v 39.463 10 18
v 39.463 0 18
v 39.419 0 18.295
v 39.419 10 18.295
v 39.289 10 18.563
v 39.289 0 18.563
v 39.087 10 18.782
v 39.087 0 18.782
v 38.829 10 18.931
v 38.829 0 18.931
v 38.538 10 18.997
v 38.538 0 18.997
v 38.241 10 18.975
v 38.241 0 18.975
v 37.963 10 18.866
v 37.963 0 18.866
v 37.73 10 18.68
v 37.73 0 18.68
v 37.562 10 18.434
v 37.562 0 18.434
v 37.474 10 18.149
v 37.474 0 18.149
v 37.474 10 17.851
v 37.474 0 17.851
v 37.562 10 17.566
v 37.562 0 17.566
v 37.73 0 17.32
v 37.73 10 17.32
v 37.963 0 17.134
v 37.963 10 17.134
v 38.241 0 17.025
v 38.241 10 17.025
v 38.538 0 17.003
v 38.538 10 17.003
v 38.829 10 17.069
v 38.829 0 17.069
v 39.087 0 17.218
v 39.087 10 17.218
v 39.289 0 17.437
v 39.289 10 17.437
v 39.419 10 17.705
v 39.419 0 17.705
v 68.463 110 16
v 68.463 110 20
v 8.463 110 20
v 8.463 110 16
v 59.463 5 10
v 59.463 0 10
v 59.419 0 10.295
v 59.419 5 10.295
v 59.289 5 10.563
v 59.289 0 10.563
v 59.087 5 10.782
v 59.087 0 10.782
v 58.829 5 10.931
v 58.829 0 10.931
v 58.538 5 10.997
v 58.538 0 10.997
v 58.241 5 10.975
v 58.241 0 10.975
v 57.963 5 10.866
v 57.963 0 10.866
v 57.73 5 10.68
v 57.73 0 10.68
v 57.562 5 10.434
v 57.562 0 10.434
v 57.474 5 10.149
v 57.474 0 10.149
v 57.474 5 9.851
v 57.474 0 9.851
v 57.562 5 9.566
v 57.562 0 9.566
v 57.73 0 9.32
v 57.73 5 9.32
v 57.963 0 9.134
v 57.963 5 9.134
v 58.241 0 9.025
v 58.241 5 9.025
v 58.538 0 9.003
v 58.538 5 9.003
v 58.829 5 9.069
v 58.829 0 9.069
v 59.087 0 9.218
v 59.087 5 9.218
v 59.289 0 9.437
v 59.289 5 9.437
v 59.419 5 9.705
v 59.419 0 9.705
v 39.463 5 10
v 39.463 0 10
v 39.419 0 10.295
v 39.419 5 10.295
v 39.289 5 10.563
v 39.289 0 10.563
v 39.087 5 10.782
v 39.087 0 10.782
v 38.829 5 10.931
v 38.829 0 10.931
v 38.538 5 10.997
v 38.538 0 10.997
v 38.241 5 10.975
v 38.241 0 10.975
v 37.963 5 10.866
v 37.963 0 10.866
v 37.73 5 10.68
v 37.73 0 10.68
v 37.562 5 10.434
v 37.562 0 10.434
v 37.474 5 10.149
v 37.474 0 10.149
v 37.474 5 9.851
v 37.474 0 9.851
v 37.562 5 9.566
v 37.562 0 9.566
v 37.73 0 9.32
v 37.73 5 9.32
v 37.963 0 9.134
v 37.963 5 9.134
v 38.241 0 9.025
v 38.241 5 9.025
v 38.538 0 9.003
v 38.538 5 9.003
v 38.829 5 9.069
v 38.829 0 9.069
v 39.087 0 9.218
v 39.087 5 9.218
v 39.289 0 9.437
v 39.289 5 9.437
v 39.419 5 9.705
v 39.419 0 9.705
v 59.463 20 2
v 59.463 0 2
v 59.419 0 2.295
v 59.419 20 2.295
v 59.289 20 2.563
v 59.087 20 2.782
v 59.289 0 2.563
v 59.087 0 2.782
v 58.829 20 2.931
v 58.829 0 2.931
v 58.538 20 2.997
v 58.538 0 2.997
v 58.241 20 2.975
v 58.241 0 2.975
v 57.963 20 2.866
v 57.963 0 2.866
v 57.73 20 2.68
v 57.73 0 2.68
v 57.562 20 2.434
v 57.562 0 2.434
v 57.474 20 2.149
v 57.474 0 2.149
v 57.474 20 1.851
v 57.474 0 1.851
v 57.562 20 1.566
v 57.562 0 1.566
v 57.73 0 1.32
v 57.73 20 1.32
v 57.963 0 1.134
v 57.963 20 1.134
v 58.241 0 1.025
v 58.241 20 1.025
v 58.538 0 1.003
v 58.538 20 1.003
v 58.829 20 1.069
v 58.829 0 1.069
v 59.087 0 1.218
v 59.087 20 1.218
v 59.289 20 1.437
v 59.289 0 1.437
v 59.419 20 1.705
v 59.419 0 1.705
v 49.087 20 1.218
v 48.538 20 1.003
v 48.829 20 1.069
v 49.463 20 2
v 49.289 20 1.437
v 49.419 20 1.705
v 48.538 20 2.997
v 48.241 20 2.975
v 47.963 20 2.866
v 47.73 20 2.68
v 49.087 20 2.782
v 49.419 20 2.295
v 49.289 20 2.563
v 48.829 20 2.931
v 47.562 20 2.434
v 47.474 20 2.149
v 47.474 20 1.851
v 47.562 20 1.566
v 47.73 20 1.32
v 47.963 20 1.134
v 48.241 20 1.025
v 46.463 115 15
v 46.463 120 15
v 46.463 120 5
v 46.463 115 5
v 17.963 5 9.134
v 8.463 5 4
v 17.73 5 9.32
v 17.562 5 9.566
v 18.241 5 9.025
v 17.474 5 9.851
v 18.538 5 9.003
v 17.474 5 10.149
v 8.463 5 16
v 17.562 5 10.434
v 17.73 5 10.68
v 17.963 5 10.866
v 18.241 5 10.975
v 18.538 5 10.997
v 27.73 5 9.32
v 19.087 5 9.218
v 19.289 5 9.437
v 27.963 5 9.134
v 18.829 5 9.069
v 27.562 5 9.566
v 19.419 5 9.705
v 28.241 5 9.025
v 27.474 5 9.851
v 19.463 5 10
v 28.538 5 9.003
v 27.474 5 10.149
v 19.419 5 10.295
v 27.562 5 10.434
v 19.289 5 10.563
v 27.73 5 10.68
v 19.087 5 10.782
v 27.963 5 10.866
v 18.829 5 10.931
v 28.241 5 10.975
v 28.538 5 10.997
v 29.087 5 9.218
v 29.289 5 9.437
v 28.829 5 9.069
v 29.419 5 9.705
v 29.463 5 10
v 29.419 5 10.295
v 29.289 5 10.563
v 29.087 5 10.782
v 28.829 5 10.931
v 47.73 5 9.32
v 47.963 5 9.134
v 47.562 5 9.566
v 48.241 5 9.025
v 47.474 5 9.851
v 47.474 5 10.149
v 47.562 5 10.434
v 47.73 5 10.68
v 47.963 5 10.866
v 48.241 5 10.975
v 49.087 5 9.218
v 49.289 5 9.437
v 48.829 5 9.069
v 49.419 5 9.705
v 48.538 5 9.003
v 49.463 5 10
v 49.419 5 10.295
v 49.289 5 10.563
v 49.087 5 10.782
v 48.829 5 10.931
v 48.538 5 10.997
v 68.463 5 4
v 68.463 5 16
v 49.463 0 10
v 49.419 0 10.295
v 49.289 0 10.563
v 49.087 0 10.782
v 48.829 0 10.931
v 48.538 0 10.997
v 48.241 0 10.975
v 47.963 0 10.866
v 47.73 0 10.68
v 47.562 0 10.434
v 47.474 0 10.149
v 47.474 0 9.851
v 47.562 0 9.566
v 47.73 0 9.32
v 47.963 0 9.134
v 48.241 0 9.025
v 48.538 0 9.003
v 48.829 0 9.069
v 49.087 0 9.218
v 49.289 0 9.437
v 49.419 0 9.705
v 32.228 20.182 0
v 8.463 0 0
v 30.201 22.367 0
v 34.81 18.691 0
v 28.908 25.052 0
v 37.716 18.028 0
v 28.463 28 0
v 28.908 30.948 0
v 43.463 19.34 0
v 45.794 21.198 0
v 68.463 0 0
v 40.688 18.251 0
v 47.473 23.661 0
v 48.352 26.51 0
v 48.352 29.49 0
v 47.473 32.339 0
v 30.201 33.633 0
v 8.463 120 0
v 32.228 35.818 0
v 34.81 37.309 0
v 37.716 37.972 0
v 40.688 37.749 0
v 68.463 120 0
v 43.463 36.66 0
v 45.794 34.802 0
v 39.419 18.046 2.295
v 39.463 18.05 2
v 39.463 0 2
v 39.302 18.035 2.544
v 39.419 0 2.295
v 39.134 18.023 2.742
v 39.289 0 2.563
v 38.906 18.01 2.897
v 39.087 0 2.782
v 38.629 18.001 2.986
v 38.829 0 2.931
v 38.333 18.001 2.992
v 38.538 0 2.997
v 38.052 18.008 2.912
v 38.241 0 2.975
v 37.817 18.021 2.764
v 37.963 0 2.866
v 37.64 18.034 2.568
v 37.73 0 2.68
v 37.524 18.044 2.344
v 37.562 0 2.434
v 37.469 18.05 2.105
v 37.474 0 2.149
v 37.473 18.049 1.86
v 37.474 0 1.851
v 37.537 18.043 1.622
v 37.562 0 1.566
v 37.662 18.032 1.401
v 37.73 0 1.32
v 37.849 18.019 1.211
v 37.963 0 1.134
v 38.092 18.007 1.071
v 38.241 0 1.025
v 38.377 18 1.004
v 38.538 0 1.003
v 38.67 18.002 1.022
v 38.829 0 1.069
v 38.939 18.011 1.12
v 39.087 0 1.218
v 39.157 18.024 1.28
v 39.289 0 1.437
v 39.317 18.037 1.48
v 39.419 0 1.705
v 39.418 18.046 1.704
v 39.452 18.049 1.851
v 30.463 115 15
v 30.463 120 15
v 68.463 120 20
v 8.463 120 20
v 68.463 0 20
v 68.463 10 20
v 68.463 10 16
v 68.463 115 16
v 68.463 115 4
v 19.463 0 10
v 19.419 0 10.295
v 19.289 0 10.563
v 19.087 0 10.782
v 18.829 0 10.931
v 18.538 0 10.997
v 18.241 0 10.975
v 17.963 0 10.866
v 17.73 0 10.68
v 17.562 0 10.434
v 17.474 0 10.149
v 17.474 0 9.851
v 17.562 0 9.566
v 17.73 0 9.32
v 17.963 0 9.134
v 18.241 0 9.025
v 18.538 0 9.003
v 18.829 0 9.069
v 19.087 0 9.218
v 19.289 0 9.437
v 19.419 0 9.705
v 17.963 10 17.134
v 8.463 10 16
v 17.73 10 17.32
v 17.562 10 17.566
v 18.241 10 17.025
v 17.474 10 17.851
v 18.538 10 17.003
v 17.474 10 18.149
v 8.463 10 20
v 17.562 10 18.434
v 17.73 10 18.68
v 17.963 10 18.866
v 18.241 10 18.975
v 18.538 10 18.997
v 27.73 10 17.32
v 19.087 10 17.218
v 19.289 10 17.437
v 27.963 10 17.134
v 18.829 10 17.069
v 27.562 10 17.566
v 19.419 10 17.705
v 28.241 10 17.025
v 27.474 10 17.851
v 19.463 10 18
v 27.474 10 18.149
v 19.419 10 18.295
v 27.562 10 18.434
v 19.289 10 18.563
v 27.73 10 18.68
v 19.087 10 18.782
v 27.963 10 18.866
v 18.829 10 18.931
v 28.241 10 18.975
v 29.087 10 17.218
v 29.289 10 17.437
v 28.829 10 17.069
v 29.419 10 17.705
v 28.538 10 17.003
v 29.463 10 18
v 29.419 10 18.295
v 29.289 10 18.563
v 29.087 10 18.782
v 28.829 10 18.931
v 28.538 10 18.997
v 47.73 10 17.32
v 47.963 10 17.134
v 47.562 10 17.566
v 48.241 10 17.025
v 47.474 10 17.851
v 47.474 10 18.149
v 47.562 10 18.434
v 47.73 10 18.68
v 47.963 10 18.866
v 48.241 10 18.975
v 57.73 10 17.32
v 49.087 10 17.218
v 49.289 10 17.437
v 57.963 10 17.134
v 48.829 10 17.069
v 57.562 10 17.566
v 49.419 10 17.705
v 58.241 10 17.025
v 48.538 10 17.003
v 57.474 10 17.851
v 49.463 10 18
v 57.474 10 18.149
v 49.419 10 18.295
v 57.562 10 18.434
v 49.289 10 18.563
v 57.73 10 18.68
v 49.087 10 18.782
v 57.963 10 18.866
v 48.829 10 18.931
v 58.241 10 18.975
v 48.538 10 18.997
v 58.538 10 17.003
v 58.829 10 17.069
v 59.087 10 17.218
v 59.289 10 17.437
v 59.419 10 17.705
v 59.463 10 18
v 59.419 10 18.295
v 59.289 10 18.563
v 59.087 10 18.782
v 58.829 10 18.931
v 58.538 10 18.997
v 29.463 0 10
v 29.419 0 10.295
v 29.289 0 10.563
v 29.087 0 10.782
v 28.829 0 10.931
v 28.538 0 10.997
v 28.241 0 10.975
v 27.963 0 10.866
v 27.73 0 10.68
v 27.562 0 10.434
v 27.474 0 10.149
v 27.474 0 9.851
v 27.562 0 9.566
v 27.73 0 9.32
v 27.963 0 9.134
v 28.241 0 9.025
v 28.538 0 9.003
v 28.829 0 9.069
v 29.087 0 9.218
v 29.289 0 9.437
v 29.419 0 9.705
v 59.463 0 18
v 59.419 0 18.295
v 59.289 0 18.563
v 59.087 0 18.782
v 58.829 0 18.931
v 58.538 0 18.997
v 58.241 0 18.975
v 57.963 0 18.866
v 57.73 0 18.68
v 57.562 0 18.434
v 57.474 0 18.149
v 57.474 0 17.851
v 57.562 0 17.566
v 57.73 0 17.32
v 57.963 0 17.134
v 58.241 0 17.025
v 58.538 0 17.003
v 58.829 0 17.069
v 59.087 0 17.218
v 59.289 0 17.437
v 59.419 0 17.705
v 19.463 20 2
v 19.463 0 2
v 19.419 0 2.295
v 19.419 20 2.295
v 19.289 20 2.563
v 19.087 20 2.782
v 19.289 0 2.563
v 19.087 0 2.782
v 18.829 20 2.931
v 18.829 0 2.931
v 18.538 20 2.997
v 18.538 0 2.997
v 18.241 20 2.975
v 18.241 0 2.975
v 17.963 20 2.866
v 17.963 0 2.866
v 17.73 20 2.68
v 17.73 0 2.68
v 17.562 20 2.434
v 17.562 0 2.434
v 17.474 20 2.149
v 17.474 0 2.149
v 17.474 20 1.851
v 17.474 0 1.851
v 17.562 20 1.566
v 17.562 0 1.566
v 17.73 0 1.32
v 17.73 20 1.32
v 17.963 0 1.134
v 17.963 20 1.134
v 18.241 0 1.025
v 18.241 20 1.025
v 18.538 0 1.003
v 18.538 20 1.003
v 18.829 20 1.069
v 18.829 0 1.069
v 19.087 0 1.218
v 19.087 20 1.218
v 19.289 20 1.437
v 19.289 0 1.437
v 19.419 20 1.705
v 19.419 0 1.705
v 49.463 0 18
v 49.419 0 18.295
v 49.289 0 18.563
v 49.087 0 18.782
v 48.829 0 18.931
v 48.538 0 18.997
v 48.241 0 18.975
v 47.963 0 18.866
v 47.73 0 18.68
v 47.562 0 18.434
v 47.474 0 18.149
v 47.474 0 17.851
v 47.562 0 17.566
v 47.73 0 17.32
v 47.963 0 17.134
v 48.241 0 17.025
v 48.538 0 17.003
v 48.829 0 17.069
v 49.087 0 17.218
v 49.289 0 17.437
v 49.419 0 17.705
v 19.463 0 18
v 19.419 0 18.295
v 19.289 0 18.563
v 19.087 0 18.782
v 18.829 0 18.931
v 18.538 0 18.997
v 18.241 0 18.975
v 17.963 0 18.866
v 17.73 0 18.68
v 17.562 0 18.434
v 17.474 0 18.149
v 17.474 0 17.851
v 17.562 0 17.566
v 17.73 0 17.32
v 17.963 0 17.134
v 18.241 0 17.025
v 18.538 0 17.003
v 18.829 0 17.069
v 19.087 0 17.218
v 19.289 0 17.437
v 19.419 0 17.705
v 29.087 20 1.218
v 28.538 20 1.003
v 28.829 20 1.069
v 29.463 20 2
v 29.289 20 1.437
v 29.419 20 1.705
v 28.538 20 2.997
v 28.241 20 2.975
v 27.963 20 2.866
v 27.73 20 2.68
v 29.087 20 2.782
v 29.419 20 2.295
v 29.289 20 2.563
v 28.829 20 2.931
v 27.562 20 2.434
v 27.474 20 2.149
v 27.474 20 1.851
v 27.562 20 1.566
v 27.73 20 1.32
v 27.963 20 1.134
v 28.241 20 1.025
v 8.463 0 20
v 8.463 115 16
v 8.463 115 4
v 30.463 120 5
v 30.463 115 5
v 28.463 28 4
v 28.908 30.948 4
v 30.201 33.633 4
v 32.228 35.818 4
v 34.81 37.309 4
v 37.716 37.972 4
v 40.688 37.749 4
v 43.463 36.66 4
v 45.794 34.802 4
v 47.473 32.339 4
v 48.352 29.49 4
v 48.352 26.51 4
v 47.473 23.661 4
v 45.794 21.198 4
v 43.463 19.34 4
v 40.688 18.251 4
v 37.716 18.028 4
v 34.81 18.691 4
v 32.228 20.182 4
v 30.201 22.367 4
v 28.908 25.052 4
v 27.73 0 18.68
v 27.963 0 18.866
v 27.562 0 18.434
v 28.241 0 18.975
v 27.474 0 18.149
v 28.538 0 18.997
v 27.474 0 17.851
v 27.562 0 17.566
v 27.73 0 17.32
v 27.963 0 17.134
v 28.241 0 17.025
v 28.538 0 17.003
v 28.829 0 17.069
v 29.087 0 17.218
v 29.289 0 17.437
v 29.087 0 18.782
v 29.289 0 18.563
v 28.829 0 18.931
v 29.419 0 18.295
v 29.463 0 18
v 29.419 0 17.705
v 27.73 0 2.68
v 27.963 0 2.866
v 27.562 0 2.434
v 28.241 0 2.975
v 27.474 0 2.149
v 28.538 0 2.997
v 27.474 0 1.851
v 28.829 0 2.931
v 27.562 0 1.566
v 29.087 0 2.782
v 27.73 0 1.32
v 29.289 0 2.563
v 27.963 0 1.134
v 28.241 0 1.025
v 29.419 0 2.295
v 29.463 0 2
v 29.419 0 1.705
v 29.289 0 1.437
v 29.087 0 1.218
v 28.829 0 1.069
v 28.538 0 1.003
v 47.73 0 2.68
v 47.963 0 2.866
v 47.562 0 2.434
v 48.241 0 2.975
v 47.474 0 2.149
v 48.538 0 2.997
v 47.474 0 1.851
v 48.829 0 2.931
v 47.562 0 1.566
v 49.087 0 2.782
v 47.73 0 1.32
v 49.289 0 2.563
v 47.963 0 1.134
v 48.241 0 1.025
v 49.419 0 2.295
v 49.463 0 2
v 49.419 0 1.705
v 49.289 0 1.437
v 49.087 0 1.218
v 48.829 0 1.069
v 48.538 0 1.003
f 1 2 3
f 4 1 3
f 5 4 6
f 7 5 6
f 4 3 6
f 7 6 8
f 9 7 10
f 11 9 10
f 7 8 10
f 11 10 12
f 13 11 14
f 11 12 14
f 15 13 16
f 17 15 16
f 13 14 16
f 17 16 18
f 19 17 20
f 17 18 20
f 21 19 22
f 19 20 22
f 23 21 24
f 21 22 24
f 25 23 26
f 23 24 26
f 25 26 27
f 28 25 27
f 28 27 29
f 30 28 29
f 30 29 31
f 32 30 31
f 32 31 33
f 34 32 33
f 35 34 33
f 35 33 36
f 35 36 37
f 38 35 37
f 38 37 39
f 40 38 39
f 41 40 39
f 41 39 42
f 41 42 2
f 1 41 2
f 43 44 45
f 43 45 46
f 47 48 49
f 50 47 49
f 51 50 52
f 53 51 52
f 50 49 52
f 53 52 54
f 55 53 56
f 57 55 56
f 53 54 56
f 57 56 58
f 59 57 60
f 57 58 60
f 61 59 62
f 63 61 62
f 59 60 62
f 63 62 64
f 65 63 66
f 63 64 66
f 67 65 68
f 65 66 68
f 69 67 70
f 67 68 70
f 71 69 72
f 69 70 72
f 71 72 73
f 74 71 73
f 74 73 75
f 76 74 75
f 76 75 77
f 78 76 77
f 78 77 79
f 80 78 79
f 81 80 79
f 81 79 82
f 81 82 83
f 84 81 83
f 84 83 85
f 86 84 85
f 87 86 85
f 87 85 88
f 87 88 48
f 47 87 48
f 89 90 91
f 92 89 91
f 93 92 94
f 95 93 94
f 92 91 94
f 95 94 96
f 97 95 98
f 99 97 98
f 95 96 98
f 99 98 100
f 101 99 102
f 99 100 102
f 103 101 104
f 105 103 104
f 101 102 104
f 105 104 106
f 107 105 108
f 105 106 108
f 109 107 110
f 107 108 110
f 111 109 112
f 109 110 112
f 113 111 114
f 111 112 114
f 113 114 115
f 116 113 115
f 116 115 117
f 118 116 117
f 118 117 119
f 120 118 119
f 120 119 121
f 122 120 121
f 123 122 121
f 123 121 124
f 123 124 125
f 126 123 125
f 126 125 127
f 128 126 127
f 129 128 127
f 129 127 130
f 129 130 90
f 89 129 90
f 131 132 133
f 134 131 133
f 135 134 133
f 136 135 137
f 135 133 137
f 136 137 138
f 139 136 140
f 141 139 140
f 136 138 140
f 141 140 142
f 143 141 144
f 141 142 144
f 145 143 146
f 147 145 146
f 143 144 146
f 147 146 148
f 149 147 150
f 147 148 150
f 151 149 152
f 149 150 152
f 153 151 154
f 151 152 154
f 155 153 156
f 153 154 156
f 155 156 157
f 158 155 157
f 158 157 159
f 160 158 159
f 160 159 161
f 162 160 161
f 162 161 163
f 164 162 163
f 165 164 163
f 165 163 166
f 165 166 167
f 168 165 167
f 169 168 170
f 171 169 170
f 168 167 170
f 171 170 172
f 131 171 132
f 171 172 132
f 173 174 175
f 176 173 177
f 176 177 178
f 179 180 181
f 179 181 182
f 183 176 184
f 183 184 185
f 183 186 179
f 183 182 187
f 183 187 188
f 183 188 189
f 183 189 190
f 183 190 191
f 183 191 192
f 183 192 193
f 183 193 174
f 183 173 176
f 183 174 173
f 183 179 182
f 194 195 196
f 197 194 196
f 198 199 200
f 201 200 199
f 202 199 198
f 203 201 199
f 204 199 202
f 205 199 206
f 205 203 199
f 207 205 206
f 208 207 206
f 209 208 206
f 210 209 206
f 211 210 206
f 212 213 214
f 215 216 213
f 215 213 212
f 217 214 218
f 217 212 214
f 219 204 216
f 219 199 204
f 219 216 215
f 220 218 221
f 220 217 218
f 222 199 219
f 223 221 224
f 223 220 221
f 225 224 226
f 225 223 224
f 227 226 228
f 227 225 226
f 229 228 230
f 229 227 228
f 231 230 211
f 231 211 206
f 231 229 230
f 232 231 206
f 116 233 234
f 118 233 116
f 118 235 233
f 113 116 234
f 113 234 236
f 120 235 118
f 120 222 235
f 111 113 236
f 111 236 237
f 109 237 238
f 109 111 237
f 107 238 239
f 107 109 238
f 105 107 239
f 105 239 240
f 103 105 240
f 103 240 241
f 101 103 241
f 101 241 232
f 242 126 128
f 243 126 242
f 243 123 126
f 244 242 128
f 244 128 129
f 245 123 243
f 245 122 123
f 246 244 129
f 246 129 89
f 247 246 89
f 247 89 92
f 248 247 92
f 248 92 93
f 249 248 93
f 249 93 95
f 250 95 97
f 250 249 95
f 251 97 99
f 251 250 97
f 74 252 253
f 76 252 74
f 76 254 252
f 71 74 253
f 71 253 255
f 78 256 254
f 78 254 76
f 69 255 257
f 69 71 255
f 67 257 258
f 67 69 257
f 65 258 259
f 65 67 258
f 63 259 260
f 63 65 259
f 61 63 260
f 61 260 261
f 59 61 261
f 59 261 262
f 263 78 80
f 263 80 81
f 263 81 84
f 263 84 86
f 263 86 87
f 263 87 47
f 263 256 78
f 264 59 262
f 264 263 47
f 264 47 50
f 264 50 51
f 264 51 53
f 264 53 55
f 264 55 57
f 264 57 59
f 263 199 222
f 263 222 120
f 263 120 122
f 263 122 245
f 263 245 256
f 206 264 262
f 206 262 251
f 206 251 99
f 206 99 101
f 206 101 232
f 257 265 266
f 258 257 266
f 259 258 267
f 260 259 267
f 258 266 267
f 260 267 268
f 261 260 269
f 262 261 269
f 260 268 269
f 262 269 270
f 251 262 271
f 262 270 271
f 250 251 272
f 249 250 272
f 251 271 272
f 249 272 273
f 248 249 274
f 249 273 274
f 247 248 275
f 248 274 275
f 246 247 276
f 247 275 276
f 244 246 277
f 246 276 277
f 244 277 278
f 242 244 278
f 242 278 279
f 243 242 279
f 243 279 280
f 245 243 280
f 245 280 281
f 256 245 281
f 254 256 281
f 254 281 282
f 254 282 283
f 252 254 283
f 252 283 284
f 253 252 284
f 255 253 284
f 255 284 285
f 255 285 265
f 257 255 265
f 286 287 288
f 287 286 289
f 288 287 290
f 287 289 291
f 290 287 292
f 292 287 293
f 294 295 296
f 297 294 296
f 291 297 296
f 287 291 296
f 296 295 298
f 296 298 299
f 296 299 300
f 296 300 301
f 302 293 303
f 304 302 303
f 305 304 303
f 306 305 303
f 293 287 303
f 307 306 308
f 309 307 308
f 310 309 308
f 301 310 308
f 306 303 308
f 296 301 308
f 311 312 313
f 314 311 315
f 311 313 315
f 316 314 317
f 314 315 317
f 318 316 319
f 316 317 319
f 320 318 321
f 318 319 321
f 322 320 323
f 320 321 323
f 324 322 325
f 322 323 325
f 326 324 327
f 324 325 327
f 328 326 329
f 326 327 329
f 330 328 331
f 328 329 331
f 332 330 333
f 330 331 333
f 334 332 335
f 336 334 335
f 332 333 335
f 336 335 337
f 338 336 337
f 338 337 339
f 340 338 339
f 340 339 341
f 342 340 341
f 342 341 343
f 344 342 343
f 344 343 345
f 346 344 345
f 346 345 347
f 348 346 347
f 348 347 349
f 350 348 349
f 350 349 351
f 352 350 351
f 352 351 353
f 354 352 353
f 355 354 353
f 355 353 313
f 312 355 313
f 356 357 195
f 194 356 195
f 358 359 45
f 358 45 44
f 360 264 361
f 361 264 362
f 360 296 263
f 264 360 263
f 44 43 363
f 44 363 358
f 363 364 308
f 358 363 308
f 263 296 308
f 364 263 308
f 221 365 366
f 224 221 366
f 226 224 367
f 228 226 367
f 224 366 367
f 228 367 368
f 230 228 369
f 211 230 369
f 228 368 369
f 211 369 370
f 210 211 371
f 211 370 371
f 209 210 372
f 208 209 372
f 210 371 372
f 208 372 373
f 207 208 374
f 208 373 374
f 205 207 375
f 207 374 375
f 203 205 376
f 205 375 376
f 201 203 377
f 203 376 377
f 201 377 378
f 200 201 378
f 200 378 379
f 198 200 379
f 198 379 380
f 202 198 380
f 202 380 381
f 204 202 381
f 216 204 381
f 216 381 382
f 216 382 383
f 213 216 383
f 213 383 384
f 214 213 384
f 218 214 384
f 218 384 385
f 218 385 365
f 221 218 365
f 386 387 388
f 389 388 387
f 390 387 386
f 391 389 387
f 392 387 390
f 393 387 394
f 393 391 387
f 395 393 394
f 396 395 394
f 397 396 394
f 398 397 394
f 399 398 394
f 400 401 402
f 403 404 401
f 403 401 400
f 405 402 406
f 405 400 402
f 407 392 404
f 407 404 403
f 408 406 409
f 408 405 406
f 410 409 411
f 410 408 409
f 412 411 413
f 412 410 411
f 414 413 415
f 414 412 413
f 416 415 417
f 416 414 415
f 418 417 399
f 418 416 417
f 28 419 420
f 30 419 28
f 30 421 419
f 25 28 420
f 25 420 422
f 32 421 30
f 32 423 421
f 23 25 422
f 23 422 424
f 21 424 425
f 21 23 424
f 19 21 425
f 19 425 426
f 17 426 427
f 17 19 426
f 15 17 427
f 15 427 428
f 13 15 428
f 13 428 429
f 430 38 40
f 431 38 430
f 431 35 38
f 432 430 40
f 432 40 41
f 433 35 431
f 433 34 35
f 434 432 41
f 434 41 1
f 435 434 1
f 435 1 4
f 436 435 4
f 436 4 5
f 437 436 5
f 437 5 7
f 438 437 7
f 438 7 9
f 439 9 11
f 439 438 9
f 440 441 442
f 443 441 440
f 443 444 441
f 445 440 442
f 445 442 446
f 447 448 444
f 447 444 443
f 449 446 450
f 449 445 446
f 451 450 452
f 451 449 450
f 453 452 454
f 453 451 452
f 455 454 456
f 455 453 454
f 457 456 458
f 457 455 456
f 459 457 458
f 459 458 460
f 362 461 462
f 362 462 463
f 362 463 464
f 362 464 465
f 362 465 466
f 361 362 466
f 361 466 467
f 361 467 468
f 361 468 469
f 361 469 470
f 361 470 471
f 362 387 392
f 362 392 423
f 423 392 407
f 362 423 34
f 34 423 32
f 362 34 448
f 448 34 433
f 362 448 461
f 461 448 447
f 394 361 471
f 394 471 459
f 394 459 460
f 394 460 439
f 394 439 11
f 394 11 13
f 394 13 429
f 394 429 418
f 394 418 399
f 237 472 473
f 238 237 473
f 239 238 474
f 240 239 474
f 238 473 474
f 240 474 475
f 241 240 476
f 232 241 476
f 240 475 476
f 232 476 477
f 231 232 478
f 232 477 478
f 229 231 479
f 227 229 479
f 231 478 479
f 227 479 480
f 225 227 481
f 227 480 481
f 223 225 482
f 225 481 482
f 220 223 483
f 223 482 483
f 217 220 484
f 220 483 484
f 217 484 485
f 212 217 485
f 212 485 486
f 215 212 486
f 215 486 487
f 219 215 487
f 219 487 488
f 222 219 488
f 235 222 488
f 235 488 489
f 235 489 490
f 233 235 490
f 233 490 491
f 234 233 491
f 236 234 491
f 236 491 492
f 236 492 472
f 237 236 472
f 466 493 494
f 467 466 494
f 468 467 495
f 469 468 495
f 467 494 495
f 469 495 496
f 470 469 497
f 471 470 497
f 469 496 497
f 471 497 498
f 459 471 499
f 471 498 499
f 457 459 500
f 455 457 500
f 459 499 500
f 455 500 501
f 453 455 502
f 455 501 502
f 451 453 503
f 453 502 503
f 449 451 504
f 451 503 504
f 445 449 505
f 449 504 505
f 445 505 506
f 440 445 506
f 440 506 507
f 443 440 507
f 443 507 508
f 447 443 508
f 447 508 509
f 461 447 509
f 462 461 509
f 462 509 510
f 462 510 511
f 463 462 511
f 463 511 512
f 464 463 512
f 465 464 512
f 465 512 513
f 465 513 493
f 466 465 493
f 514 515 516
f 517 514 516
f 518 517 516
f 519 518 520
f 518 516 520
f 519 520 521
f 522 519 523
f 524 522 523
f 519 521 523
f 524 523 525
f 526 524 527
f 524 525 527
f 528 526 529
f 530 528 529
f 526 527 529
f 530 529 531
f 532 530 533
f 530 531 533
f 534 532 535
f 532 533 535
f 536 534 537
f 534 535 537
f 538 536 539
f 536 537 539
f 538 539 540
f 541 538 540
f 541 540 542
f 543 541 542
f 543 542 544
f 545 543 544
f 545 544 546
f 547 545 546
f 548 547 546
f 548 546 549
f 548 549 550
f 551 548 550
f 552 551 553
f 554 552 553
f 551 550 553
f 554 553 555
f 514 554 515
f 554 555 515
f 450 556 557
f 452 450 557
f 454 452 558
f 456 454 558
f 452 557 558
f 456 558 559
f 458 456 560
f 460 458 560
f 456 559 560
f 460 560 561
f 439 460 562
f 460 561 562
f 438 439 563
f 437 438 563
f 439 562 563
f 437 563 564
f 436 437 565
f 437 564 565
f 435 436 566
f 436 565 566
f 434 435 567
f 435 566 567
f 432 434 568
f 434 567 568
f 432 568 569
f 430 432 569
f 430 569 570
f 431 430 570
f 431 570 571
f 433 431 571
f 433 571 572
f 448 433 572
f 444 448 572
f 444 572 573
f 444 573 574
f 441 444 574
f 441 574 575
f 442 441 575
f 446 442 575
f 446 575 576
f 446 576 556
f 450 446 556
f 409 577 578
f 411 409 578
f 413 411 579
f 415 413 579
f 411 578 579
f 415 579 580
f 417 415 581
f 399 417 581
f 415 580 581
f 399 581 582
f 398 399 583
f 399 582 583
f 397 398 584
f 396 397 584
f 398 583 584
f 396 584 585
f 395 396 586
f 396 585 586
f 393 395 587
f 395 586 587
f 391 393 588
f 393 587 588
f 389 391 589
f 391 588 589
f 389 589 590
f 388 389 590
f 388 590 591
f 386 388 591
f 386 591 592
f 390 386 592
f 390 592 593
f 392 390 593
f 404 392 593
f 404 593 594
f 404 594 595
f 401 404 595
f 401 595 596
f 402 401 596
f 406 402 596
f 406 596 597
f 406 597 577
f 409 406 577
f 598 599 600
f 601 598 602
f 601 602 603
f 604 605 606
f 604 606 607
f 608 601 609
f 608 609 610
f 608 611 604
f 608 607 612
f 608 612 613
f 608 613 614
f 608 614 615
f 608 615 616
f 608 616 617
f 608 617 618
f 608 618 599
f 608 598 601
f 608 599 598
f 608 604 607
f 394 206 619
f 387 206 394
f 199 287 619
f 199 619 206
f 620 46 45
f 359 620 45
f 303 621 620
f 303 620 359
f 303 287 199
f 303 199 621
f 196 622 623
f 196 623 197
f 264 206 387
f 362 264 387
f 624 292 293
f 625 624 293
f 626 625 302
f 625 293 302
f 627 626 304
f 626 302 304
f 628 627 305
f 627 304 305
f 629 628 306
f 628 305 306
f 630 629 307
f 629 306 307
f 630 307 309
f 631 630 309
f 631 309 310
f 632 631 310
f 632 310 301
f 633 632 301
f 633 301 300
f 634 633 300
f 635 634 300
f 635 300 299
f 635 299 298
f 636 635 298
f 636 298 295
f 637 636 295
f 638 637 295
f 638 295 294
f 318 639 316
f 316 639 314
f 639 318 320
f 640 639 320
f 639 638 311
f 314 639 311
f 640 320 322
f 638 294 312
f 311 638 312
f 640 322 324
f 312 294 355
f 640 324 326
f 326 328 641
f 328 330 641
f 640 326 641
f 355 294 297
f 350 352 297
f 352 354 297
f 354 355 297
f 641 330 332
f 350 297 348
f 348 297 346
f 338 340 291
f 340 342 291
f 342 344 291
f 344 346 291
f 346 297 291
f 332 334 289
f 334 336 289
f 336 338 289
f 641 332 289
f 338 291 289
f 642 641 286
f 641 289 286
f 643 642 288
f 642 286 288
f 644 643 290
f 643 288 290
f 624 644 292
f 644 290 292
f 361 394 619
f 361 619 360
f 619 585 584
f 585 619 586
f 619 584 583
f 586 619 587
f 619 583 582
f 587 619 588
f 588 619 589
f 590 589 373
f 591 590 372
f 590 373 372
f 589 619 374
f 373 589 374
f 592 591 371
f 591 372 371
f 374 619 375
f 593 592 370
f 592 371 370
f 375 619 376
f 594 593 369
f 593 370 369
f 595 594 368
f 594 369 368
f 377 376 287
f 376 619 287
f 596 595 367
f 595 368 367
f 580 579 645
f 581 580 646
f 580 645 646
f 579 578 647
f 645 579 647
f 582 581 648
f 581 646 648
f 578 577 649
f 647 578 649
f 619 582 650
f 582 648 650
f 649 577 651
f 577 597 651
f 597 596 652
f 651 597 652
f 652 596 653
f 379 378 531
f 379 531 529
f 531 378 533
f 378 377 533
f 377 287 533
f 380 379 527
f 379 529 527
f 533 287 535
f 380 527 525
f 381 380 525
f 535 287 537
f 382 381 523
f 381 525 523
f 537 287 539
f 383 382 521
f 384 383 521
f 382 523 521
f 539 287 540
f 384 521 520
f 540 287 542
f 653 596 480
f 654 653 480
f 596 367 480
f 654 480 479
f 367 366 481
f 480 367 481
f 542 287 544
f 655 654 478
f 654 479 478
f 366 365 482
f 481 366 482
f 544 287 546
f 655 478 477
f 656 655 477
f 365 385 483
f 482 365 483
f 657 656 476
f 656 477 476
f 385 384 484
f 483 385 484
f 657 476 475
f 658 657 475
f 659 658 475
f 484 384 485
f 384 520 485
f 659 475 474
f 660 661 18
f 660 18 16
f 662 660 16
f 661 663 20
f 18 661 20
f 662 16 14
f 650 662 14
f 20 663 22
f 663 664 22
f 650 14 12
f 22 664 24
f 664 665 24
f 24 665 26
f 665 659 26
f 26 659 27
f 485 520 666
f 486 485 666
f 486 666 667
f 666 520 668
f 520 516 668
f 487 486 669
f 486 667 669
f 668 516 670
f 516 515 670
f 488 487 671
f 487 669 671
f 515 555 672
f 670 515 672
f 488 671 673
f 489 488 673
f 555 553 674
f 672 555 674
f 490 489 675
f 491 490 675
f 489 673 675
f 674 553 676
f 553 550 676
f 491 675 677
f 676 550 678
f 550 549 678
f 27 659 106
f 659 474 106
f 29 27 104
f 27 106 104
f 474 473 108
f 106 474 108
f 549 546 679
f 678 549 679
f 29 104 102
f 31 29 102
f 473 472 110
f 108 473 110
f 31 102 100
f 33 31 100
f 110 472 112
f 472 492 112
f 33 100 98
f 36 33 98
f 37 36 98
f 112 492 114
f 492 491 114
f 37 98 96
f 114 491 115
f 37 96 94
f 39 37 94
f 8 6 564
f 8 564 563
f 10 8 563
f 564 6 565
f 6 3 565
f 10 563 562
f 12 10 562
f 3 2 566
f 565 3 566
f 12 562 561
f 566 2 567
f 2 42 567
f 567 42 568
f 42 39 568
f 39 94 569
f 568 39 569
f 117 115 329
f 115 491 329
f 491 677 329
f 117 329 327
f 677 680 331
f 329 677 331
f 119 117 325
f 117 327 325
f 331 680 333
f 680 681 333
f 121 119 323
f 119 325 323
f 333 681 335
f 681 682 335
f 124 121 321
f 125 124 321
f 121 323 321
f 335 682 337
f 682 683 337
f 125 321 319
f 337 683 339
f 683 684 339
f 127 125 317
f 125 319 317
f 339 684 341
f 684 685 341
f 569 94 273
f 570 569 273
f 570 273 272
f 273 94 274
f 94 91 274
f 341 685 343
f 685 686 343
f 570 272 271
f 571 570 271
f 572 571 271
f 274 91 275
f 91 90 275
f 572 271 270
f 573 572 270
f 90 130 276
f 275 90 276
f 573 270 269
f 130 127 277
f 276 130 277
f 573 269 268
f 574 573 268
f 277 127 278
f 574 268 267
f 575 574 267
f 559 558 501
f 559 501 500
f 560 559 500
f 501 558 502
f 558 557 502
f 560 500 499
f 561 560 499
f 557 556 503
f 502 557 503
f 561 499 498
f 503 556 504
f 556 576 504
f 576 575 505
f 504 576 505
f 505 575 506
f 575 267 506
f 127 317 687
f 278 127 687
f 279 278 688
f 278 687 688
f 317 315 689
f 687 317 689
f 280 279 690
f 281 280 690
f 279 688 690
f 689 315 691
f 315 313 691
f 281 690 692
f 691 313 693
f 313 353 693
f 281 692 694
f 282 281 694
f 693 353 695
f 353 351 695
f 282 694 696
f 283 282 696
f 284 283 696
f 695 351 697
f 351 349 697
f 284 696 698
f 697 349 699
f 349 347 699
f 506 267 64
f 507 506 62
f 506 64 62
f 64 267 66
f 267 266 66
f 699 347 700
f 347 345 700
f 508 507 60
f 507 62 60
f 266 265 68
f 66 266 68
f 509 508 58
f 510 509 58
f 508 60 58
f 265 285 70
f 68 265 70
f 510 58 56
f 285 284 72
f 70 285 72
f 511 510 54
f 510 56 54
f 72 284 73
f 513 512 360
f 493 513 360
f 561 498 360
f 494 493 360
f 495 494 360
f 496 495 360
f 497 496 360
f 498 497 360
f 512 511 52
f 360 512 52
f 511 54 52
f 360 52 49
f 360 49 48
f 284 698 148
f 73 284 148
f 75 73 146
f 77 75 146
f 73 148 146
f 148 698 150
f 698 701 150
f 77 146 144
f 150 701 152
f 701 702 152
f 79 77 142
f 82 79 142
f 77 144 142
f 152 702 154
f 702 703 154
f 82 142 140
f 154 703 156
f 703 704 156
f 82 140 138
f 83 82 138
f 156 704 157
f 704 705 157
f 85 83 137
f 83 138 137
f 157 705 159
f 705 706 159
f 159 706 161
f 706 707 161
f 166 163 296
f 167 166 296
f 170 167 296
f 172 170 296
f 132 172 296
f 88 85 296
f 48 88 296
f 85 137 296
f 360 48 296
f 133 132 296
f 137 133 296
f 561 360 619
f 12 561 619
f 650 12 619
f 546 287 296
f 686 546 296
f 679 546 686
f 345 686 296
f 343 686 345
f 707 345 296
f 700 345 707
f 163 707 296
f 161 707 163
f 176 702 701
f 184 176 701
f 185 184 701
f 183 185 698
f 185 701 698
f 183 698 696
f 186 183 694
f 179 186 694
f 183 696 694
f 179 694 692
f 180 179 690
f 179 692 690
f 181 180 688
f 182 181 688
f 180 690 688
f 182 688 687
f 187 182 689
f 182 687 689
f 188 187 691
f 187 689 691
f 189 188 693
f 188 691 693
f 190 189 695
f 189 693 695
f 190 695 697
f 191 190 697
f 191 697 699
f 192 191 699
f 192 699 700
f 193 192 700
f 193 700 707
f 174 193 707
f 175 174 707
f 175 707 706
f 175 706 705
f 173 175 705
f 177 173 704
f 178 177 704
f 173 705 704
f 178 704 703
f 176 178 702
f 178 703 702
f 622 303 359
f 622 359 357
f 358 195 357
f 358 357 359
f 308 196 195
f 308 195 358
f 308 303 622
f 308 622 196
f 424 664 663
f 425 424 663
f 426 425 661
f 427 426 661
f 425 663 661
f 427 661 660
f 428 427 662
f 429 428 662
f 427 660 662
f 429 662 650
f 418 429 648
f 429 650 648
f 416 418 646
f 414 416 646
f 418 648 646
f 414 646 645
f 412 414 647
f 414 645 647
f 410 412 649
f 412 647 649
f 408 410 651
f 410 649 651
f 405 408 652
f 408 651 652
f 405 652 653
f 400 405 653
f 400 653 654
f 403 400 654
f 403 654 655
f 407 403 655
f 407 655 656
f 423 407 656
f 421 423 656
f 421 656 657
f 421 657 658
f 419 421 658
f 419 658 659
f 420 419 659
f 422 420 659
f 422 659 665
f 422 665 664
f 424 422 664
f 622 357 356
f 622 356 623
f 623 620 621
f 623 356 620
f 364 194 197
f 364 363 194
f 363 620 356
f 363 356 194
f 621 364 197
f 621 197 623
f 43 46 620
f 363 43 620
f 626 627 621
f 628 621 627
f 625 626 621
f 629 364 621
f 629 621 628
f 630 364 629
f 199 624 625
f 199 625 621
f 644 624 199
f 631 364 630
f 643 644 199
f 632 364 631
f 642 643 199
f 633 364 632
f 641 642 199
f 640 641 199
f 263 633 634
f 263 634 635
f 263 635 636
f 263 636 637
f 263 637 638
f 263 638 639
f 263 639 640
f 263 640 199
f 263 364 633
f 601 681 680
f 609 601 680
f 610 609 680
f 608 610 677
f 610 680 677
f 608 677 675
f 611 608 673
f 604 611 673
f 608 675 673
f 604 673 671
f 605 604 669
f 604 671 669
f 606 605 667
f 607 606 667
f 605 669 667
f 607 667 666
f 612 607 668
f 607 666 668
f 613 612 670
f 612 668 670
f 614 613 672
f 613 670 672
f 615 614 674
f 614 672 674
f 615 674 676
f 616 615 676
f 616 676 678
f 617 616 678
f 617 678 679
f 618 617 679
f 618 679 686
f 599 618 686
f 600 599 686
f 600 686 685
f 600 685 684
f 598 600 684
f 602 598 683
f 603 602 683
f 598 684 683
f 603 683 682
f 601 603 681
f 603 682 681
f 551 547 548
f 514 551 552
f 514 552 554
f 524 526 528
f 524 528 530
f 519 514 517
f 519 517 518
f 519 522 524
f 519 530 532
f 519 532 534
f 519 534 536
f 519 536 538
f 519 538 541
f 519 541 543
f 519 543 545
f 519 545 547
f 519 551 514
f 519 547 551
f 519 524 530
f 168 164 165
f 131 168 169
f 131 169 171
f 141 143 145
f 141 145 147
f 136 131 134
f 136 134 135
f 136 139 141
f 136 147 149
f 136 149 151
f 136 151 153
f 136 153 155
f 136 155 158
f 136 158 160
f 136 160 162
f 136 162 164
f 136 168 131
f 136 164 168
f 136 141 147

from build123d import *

# Parameters (mm, degrees)
ESQUISSE1_W                = 60
ESQUISSE1_H                = 120
BOSS_EXTRU_1_DEPTH         = 20
ENL_V_MAT_EXTRU_1_DEPTH    = 61
ESQUISSE3_W                = 16
ESQUISSE3_H                = 10
ENL_V_MAT_EXTRU_3_DEPTH    = 5
ESQUISSE4_R                = 10
ENL_V_MAT_EXTRU_4_DEPTH    = 21
ESQUISSE5_R                = 1
ENL_V_MAT_EXTRU_5_DEPTH    = 20
R_P_TITION_LIN_AIRE1_COUNT = 3
R_P_TITION_LIN_AIRE1_PITCH = 10
R_P_TITION_LIN_AIRE2_COUNT = 3
R_P_TITION_LIN_AIRE2_PITCH = 10


with BuildPart() as part:
    # Esquisse1 → Boss.-Extru.1 (new body)
    with BuildSketch(Plane.XY):
        with Locations((38.463255814, 60)):
            Rectangle(ESQUISSE1_W, ESQUISSE1_H)
    extrude(amount=BOSS_EXTRU_1_DEPTH)

    # Esquisse2 → Enlèv. mat.-Extru.1 (cut, through all)
    with BuildSketch(Plane(origin=(68.463255814, 0, 0), x_dir=(0, 0, -1), z_dir=(1, 0, 0))):
        Polygon((-20, 110), (-16, 110), (-16, 115), (-4, 115), (-4, 5), (-16, 5), (-16, 10), (-20, 10), align=None)
    extrude(amount=-ENL_V_MAT_EXTRU_1_DEPTH, mode=Mode.SUBTRACT)

    # Esquisse3 → Enlèv. mat.-Extru.3 (cut)
    with BuildSketch(Plane(origin=(0, 120, 0), x_dir=(1, 0, 0), z_dir=(0, 1, 0))):
        with Locations((38.463255814, -10)):
            Rectangle(ESQUISSE3_W, ESQUISSE3_H)
    extrude(amount=-ENL_V_MAT_EXTRU_3_DEPTH, mode=Mode.SUBTRACT)

    # Esquisse4 → Enlèv. mat.-Extru.4 (cut, through all)
    with BuildSketch(Plane(origin=(0, 0, 0), x_dir=(-1, 0, 0), z_dir=(0, 0, -1))):
        with Locations((-38.463255814, 28)):
            Circle(ESQUISSE4_R)
    extrude(amount=-ENL_V_MAT_EXTRU_4_DEPTH, mode=Mode.SUBTRACT)

    # Esquisse5 → Enlèv. mat.-Extru.5 (cut)
    with BuildSketch(Plane.XZ):
        with Locations((38.463255814, 18)):
            Circle(ESQUISSE5_R)
        with Locations((38.463255814, 2)):
            Circle(ESQUISSE5_R)
        with Locations((38.463255814, 10)):
            Circle(ESQUISSE5_R)
    enl_v_mat_extru_5 = extrude(amount=-ENL_V_MAT_EXTRU_5_DEPTH, mode=Mode.SUBTRACT)

    # Répétition linéaire1: Enlèv. mat.-Extru.5 ×3
    with Locations(*[(i * R_P_TITION_LIN_AIRE1_PITCH, 0, 0) for i in range(1, R_P_TITION_LIN_AIRE1_COUNT)]):
        add(enl_v_mat_extru_5, mode=Mode.SUBTRACT)

    # Répétition linéaire2: Enlèv. mat.-Extru.5 ×3
    with Locations(*[(-i * R_P_TITION_LIN_AIRE2_PITCH, 0, 0) for i in range(1, R_P_TITION_LIN_AIRE2_COUNT)]):
        add(enl_v_mat_extru_5, mode=Mode.SUBTRACT)


solid = part.part
